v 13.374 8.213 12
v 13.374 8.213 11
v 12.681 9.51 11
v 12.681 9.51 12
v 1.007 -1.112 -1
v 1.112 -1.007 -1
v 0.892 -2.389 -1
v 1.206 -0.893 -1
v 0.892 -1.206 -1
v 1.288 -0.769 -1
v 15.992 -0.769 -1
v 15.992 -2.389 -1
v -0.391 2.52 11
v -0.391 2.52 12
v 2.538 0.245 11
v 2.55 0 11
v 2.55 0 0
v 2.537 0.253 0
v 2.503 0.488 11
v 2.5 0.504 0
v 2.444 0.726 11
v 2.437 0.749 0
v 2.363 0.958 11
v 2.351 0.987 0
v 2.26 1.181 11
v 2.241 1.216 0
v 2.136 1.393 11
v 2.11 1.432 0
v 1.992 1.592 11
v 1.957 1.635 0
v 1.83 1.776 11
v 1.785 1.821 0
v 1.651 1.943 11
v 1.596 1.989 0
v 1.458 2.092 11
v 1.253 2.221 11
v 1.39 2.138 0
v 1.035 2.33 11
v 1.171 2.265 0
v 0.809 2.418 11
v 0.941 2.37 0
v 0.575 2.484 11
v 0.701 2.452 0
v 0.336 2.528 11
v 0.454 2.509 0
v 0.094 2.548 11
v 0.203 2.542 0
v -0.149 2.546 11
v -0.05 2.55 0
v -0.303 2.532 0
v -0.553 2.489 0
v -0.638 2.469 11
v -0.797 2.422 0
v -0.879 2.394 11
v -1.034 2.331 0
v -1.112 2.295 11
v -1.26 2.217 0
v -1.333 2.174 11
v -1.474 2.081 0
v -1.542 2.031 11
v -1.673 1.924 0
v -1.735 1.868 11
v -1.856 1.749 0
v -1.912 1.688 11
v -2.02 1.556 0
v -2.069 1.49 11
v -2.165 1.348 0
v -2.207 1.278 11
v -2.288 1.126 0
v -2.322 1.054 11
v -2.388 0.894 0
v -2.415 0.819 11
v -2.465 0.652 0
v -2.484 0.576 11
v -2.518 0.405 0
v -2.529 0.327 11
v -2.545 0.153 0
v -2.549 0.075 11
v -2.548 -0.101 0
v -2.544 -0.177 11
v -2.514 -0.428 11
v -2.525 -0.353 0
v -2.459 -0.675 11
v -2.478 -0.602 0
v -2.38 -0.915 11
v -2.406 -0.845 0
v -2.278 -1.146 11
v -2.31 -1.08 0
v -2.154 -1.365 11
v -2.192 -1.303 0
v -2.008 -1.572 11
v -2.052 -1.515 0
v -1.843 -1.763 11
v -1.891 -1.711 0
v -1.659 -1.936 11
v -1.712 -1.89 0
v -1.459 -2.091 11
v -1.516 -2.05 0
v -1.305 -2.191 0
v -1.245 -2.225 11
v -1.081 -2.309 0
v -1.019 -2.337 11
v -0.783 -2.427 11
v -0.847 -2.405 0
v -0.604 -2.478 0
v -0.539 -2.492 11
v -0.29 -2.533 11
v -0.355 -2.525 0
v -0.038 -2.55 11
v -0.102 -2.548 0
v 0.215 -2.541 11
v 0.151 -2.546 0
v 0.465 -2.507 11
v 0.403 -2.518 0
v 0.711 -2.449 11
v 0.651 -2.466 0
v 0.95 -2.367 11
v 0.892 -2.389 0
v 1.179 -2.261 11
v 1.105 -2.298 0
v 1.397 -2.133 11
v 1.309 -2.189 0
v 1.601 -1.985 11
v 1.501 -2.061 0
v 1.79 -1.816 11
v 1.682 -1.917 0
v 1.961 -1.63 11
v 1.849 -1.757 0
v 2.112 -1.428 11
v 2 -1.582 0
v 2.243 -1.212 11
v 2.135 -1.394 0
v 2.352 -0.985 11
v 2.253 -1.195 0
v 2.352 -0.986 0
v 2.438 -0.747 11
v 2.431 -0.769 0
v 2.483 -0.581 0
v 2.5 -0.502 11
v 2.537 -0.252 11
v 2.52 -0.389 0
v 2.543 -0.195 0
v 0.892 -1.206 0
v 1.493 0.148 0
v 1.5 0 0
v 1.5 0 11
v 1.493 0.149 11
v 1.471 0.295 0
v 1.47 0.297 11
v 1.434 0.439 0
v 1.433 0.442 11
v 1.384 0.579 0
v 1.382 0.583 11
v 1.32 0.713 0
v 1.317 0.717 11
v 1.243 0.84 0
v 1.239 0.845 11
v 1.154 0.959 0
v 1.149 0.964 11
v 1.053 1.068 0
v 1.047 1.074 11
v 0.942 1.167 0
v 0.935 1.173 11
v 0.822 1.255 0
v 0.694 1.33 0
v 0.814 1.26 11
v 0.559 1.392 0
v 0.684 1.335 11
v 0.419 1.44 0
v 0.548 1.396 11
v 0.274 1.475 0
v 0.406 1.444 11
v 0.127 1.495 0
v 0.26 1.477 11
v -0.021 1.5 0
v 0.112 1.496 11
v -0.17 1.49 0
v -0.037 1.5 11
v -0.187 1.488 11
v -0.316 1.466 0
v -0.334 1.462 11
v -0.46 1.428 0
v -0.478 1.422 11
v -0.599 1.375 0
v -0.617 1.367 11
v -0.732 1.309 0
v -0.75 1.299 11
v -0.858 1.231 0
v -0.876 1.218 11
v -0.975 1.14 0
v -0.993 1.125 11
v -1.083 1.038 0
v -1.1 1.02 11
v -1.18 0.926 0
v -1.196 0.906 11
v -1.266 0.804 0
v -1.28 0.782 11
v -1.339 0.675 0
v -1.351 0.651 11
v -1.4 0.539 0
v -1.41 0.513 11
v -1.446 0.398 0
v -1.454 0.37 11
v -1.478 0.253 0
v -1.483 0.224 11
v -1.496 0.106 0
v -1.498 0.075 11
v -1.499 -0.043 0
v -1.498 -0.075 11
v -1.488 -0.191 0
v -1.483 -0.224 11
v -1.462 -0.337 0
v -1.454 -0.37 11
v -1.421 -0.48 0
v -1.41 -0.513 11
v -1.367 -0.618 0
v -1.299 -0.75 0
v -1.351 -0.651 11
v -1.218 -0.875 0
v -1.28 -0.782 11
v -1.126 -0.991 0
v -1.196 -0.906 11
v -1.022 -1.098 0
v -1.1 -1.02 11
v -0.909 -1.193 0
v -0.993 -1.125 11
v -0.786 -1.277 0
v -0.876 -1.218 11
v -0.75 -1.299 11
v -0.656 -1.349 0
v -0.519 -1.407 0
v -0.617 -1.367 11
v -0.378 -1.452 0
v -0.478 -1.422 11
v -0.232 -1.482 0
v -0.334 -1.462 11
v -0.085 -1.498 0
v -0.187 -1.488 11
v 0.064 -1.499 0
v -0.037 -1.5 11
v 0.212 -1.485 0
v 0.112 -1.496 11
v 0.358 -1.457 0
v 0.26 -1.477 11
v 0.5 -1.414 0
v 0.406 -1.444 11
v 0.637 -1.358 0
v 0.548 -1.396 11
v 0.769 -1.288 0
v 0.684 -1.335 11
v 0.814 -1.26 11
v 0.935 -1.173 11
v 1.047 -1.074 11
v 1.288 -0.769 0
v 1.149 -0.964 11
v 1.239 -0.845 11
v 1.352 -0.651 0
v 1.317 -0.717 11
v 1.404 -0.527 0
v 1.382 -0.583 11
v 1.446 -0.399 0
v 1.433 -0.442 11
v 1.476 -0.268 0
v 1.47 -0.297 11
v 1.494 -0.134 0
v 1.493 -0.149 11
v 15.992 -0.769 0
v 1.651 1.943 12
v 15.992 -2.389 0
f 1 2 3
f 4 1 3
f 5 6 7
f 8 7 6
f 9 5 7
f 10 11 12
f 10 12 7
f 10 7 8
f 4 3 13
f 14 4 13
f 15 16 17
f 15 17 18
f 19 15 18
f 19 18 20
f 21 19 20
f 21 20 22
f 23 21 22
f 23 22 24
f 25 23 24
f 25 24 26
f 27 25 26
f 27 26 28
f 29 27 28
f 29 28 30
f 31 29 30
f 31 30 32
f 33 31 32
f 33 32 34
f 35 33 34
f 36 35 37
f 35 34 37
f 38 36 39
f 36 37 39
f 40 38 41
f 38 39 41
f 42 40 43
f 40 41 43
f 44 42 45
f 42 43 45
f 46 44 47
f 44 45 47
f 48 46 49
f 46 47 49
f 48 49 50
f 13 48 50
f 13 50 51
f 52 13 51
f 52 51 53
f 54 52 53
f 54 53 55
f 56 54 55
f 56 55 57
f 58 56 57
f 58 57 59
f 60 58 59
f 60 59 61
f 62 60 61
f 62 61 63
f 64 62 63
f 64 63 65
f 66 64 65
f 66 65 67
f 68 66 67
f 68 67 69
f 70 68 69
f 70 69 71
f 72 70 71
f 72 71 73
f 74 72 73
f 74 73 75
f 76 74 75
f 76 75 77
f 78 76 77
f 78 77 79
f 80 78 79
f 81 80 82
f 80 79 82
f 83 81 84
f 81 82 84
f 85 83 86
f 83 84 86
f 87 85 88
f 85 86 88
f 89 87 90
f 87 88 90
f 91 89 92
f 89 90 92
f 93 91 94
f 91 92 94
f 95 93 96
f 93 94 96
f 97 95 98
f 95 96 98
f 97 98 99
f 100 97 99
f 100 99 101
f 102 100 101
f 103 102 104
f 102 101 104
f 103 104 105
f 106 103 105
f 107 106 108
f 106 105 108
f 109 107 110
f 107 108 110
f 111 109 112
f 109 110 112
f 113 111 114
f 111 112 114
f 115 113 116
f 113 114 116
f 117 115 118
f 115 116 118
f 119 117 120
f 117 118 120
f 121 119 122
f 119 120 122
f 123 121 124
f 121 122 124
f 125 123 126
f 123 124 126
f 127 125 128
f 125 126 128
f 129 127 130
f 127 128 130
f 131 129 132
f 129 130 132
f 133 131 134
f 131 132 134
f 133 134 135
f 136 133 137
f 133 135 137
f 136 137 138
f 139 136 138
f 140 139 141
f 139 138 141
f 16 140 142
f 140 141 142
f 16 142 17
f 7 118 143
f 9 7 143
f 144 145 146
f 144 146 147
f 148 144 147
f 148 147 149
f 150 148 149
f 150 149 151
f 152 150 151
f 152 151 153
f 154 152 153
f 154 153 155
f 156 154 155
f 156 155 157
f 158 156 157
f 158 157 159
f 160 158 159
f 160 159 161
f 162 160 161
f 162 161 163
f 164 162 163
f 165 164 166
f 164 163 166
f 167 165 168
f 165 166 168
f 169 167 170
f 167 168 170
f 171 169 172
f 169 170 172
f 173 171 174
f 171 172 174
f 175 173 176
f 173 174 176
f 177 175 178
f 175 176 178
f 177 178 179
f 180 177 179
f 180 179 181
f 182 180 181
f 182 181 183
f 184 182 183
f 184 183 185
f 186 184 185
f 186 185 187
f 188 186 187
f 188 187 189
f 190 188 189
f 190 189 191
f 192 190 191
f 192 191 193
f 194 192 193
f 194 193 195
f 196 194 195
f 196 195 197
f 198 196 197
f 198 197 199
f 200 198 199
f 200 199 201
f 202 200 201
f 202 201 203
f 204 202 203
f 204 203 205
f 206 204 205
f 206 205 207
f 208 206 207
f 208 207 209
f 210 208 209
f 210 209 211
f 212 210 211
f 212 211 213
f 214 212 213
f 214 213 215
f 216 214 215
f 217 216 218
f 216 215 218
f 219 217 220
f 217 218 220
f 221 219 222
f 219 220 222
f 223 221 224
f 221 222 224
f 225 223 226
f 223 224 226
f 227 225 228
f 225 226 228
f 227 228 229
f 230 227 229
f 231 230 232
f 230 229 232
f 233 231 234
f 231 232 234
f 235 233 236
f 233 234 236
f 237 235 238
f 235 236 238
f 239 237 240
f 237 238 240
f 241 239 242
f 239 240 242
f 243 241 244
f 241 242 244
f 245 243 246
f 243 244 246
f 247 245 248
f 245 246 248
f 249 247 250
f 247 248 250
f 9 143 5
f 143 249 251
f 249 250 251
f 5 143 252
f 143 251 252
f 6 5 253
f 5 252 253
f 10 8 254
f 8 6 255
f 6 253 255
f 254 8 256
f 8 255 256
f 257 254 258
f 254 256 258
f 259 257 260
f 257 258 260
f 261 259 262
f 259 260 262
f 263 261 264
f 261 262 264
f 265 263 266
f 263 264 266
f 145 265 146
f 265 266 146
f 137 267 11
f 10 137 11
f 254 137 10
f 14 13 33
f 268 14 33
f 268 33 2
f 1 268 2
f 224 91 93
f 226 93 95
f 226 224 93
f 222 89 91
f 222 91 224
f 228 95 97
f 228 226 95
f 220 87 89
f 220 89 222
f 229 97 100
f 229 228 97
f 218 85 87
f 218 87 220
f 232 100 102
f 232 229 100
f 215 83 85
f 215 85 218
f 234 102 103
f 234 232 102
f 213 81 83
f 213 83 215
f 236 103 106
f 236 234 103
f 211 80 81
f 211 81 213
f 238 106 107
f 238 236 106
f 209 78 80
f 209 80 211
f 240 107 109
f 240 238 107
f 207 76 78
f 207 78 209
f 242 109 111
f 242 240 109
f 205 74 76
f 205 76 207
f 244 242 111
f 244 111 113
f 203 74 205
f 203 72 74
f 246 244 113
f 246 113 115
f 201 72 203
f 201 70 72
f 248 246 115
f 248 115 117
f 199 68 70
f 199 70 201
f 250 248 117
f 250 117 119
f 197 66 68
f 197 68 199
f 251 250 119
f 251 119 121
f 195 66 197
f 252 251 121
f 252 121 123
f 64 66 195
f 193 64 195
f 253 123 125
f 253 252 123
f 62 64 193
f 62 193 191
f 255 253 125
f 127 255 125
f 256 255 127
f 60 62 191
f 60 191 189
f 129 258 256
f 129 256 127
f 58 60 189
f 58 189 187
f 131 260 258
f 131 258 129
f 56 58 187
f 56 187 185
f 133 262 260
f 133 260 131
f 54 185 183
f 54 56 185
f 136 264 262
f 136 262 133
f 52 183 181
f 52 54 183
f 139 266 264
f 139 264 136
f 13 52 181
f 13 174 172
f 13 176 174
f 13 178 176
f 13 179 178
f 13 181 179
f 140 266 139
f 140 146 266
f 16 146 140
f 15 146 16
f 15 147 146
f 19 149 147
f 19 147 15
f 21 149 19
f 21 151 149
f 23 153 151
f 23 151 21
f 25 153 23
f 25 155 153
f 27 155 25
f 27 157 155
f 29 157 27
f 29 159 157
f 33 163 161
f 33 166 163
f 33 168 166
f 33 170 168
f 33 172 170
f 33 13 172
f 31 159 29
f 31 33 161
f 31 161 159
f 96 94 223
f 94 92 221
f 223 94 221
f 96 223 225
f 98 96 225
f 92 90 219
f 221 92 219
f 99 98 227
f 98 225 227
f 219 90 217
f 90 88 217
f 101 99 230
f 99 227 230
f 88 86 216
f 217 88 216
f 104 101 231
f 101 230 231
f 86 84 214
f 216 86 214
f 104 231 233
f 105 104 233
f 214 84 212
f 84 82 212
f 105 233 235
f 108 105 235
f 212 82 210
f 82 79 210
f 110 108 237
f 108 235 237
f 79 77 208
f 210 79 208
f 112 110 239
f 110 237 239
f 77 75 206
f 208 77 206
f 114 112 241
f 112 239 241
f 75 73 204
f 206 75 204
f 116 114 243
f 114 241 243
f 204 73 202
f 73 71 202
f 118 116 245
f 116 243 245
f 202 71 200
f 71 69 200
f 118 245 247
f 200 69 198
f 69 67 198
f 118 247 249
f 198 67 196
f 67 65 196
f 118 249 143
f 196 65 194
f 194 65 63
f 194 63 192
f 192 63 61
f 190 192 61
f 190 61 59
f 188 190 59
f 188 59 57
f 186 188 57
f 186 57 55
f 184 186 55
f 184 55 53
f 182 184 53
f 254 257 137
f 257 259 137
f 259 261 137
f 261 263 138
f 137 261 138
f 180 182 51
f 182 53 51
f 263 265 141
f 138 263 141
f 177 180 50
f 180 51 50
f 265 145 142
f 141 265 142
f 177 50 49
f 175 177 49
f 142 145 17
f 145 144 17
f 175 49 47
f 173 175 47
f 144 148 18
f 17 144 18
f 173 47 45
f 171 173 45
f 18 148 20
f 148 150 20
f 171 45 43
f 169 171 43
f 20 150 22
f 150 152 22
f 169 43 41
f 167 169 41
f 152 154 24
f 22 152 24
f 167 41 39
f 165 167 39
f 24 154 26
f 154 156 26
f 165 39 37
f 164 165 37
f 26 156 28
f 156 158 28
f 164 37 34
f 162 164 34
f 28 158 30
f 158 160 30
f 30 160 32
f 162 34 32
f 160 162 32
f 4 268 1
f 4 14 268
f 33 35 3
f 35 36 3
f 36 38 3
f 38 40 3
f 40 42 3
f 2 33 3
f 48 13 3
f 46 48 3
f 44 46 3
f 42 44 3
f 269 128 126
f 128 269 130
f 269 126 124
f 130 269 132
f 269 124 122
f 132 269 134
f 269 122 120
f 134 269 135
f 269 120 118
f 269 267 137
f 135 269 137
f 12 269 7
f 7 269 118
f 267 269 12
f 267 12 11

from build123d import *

# Parameters (mm, degrees)
SKETCH1_R      = 2.55
EXTRUDE1_DEPTH = 11
EXTRUDE2_DEPTH = 1
SKETCH3_W      = 15.099881368
SKETCH3_H      = 1.61958708
EXTRUDE3_DEPTH = 1
SKETCH4_R      = 1.5
EXTRUDE4_DEPTH = 13


with BuildPart() as part:
    # Sketch1 → Extrude1 (new body)
    with BuildSketch(Plane.XY):
        Circle(SKETCH1_R)
    extrude(amount=EXTRUDE1_DEPTH)

    # Sketch2 → Extrude2 (add)
    with BuildSketch(Plane.XY.offset(11)):
        Polygon((1.650889975, 1.943466565), (13.374427377, 8.212697839), (12.680705309, 9.509966398), (-0.390866423, 2.519865758), align=None)
    extrude(amount=EXTRUDE2_DEPTH)

    # Sketch3 → Extrude3 (add)
    with BuildSketch(Plane(origin=(0, 0, 0), x_dir=(-1, 0, 0), z_dir=(0, 0, -1))):
        with Locations((-8.442177906, -1.57901636)):
            Rectangle(SKETCH3_W, SKETCH3_H)
    extrude(amount=EXTRUDE3_DEPTH)

    # Sketch4 → Extrude4 (cut, through all)
    with BuildSketch(Plane.XY.offset(11)):
        Circle(SKETCH4_R)
    extrude(amount=-EXTRUDE4_DEPTH, mode=Mode.SUBTRACT)


solid = part.part
